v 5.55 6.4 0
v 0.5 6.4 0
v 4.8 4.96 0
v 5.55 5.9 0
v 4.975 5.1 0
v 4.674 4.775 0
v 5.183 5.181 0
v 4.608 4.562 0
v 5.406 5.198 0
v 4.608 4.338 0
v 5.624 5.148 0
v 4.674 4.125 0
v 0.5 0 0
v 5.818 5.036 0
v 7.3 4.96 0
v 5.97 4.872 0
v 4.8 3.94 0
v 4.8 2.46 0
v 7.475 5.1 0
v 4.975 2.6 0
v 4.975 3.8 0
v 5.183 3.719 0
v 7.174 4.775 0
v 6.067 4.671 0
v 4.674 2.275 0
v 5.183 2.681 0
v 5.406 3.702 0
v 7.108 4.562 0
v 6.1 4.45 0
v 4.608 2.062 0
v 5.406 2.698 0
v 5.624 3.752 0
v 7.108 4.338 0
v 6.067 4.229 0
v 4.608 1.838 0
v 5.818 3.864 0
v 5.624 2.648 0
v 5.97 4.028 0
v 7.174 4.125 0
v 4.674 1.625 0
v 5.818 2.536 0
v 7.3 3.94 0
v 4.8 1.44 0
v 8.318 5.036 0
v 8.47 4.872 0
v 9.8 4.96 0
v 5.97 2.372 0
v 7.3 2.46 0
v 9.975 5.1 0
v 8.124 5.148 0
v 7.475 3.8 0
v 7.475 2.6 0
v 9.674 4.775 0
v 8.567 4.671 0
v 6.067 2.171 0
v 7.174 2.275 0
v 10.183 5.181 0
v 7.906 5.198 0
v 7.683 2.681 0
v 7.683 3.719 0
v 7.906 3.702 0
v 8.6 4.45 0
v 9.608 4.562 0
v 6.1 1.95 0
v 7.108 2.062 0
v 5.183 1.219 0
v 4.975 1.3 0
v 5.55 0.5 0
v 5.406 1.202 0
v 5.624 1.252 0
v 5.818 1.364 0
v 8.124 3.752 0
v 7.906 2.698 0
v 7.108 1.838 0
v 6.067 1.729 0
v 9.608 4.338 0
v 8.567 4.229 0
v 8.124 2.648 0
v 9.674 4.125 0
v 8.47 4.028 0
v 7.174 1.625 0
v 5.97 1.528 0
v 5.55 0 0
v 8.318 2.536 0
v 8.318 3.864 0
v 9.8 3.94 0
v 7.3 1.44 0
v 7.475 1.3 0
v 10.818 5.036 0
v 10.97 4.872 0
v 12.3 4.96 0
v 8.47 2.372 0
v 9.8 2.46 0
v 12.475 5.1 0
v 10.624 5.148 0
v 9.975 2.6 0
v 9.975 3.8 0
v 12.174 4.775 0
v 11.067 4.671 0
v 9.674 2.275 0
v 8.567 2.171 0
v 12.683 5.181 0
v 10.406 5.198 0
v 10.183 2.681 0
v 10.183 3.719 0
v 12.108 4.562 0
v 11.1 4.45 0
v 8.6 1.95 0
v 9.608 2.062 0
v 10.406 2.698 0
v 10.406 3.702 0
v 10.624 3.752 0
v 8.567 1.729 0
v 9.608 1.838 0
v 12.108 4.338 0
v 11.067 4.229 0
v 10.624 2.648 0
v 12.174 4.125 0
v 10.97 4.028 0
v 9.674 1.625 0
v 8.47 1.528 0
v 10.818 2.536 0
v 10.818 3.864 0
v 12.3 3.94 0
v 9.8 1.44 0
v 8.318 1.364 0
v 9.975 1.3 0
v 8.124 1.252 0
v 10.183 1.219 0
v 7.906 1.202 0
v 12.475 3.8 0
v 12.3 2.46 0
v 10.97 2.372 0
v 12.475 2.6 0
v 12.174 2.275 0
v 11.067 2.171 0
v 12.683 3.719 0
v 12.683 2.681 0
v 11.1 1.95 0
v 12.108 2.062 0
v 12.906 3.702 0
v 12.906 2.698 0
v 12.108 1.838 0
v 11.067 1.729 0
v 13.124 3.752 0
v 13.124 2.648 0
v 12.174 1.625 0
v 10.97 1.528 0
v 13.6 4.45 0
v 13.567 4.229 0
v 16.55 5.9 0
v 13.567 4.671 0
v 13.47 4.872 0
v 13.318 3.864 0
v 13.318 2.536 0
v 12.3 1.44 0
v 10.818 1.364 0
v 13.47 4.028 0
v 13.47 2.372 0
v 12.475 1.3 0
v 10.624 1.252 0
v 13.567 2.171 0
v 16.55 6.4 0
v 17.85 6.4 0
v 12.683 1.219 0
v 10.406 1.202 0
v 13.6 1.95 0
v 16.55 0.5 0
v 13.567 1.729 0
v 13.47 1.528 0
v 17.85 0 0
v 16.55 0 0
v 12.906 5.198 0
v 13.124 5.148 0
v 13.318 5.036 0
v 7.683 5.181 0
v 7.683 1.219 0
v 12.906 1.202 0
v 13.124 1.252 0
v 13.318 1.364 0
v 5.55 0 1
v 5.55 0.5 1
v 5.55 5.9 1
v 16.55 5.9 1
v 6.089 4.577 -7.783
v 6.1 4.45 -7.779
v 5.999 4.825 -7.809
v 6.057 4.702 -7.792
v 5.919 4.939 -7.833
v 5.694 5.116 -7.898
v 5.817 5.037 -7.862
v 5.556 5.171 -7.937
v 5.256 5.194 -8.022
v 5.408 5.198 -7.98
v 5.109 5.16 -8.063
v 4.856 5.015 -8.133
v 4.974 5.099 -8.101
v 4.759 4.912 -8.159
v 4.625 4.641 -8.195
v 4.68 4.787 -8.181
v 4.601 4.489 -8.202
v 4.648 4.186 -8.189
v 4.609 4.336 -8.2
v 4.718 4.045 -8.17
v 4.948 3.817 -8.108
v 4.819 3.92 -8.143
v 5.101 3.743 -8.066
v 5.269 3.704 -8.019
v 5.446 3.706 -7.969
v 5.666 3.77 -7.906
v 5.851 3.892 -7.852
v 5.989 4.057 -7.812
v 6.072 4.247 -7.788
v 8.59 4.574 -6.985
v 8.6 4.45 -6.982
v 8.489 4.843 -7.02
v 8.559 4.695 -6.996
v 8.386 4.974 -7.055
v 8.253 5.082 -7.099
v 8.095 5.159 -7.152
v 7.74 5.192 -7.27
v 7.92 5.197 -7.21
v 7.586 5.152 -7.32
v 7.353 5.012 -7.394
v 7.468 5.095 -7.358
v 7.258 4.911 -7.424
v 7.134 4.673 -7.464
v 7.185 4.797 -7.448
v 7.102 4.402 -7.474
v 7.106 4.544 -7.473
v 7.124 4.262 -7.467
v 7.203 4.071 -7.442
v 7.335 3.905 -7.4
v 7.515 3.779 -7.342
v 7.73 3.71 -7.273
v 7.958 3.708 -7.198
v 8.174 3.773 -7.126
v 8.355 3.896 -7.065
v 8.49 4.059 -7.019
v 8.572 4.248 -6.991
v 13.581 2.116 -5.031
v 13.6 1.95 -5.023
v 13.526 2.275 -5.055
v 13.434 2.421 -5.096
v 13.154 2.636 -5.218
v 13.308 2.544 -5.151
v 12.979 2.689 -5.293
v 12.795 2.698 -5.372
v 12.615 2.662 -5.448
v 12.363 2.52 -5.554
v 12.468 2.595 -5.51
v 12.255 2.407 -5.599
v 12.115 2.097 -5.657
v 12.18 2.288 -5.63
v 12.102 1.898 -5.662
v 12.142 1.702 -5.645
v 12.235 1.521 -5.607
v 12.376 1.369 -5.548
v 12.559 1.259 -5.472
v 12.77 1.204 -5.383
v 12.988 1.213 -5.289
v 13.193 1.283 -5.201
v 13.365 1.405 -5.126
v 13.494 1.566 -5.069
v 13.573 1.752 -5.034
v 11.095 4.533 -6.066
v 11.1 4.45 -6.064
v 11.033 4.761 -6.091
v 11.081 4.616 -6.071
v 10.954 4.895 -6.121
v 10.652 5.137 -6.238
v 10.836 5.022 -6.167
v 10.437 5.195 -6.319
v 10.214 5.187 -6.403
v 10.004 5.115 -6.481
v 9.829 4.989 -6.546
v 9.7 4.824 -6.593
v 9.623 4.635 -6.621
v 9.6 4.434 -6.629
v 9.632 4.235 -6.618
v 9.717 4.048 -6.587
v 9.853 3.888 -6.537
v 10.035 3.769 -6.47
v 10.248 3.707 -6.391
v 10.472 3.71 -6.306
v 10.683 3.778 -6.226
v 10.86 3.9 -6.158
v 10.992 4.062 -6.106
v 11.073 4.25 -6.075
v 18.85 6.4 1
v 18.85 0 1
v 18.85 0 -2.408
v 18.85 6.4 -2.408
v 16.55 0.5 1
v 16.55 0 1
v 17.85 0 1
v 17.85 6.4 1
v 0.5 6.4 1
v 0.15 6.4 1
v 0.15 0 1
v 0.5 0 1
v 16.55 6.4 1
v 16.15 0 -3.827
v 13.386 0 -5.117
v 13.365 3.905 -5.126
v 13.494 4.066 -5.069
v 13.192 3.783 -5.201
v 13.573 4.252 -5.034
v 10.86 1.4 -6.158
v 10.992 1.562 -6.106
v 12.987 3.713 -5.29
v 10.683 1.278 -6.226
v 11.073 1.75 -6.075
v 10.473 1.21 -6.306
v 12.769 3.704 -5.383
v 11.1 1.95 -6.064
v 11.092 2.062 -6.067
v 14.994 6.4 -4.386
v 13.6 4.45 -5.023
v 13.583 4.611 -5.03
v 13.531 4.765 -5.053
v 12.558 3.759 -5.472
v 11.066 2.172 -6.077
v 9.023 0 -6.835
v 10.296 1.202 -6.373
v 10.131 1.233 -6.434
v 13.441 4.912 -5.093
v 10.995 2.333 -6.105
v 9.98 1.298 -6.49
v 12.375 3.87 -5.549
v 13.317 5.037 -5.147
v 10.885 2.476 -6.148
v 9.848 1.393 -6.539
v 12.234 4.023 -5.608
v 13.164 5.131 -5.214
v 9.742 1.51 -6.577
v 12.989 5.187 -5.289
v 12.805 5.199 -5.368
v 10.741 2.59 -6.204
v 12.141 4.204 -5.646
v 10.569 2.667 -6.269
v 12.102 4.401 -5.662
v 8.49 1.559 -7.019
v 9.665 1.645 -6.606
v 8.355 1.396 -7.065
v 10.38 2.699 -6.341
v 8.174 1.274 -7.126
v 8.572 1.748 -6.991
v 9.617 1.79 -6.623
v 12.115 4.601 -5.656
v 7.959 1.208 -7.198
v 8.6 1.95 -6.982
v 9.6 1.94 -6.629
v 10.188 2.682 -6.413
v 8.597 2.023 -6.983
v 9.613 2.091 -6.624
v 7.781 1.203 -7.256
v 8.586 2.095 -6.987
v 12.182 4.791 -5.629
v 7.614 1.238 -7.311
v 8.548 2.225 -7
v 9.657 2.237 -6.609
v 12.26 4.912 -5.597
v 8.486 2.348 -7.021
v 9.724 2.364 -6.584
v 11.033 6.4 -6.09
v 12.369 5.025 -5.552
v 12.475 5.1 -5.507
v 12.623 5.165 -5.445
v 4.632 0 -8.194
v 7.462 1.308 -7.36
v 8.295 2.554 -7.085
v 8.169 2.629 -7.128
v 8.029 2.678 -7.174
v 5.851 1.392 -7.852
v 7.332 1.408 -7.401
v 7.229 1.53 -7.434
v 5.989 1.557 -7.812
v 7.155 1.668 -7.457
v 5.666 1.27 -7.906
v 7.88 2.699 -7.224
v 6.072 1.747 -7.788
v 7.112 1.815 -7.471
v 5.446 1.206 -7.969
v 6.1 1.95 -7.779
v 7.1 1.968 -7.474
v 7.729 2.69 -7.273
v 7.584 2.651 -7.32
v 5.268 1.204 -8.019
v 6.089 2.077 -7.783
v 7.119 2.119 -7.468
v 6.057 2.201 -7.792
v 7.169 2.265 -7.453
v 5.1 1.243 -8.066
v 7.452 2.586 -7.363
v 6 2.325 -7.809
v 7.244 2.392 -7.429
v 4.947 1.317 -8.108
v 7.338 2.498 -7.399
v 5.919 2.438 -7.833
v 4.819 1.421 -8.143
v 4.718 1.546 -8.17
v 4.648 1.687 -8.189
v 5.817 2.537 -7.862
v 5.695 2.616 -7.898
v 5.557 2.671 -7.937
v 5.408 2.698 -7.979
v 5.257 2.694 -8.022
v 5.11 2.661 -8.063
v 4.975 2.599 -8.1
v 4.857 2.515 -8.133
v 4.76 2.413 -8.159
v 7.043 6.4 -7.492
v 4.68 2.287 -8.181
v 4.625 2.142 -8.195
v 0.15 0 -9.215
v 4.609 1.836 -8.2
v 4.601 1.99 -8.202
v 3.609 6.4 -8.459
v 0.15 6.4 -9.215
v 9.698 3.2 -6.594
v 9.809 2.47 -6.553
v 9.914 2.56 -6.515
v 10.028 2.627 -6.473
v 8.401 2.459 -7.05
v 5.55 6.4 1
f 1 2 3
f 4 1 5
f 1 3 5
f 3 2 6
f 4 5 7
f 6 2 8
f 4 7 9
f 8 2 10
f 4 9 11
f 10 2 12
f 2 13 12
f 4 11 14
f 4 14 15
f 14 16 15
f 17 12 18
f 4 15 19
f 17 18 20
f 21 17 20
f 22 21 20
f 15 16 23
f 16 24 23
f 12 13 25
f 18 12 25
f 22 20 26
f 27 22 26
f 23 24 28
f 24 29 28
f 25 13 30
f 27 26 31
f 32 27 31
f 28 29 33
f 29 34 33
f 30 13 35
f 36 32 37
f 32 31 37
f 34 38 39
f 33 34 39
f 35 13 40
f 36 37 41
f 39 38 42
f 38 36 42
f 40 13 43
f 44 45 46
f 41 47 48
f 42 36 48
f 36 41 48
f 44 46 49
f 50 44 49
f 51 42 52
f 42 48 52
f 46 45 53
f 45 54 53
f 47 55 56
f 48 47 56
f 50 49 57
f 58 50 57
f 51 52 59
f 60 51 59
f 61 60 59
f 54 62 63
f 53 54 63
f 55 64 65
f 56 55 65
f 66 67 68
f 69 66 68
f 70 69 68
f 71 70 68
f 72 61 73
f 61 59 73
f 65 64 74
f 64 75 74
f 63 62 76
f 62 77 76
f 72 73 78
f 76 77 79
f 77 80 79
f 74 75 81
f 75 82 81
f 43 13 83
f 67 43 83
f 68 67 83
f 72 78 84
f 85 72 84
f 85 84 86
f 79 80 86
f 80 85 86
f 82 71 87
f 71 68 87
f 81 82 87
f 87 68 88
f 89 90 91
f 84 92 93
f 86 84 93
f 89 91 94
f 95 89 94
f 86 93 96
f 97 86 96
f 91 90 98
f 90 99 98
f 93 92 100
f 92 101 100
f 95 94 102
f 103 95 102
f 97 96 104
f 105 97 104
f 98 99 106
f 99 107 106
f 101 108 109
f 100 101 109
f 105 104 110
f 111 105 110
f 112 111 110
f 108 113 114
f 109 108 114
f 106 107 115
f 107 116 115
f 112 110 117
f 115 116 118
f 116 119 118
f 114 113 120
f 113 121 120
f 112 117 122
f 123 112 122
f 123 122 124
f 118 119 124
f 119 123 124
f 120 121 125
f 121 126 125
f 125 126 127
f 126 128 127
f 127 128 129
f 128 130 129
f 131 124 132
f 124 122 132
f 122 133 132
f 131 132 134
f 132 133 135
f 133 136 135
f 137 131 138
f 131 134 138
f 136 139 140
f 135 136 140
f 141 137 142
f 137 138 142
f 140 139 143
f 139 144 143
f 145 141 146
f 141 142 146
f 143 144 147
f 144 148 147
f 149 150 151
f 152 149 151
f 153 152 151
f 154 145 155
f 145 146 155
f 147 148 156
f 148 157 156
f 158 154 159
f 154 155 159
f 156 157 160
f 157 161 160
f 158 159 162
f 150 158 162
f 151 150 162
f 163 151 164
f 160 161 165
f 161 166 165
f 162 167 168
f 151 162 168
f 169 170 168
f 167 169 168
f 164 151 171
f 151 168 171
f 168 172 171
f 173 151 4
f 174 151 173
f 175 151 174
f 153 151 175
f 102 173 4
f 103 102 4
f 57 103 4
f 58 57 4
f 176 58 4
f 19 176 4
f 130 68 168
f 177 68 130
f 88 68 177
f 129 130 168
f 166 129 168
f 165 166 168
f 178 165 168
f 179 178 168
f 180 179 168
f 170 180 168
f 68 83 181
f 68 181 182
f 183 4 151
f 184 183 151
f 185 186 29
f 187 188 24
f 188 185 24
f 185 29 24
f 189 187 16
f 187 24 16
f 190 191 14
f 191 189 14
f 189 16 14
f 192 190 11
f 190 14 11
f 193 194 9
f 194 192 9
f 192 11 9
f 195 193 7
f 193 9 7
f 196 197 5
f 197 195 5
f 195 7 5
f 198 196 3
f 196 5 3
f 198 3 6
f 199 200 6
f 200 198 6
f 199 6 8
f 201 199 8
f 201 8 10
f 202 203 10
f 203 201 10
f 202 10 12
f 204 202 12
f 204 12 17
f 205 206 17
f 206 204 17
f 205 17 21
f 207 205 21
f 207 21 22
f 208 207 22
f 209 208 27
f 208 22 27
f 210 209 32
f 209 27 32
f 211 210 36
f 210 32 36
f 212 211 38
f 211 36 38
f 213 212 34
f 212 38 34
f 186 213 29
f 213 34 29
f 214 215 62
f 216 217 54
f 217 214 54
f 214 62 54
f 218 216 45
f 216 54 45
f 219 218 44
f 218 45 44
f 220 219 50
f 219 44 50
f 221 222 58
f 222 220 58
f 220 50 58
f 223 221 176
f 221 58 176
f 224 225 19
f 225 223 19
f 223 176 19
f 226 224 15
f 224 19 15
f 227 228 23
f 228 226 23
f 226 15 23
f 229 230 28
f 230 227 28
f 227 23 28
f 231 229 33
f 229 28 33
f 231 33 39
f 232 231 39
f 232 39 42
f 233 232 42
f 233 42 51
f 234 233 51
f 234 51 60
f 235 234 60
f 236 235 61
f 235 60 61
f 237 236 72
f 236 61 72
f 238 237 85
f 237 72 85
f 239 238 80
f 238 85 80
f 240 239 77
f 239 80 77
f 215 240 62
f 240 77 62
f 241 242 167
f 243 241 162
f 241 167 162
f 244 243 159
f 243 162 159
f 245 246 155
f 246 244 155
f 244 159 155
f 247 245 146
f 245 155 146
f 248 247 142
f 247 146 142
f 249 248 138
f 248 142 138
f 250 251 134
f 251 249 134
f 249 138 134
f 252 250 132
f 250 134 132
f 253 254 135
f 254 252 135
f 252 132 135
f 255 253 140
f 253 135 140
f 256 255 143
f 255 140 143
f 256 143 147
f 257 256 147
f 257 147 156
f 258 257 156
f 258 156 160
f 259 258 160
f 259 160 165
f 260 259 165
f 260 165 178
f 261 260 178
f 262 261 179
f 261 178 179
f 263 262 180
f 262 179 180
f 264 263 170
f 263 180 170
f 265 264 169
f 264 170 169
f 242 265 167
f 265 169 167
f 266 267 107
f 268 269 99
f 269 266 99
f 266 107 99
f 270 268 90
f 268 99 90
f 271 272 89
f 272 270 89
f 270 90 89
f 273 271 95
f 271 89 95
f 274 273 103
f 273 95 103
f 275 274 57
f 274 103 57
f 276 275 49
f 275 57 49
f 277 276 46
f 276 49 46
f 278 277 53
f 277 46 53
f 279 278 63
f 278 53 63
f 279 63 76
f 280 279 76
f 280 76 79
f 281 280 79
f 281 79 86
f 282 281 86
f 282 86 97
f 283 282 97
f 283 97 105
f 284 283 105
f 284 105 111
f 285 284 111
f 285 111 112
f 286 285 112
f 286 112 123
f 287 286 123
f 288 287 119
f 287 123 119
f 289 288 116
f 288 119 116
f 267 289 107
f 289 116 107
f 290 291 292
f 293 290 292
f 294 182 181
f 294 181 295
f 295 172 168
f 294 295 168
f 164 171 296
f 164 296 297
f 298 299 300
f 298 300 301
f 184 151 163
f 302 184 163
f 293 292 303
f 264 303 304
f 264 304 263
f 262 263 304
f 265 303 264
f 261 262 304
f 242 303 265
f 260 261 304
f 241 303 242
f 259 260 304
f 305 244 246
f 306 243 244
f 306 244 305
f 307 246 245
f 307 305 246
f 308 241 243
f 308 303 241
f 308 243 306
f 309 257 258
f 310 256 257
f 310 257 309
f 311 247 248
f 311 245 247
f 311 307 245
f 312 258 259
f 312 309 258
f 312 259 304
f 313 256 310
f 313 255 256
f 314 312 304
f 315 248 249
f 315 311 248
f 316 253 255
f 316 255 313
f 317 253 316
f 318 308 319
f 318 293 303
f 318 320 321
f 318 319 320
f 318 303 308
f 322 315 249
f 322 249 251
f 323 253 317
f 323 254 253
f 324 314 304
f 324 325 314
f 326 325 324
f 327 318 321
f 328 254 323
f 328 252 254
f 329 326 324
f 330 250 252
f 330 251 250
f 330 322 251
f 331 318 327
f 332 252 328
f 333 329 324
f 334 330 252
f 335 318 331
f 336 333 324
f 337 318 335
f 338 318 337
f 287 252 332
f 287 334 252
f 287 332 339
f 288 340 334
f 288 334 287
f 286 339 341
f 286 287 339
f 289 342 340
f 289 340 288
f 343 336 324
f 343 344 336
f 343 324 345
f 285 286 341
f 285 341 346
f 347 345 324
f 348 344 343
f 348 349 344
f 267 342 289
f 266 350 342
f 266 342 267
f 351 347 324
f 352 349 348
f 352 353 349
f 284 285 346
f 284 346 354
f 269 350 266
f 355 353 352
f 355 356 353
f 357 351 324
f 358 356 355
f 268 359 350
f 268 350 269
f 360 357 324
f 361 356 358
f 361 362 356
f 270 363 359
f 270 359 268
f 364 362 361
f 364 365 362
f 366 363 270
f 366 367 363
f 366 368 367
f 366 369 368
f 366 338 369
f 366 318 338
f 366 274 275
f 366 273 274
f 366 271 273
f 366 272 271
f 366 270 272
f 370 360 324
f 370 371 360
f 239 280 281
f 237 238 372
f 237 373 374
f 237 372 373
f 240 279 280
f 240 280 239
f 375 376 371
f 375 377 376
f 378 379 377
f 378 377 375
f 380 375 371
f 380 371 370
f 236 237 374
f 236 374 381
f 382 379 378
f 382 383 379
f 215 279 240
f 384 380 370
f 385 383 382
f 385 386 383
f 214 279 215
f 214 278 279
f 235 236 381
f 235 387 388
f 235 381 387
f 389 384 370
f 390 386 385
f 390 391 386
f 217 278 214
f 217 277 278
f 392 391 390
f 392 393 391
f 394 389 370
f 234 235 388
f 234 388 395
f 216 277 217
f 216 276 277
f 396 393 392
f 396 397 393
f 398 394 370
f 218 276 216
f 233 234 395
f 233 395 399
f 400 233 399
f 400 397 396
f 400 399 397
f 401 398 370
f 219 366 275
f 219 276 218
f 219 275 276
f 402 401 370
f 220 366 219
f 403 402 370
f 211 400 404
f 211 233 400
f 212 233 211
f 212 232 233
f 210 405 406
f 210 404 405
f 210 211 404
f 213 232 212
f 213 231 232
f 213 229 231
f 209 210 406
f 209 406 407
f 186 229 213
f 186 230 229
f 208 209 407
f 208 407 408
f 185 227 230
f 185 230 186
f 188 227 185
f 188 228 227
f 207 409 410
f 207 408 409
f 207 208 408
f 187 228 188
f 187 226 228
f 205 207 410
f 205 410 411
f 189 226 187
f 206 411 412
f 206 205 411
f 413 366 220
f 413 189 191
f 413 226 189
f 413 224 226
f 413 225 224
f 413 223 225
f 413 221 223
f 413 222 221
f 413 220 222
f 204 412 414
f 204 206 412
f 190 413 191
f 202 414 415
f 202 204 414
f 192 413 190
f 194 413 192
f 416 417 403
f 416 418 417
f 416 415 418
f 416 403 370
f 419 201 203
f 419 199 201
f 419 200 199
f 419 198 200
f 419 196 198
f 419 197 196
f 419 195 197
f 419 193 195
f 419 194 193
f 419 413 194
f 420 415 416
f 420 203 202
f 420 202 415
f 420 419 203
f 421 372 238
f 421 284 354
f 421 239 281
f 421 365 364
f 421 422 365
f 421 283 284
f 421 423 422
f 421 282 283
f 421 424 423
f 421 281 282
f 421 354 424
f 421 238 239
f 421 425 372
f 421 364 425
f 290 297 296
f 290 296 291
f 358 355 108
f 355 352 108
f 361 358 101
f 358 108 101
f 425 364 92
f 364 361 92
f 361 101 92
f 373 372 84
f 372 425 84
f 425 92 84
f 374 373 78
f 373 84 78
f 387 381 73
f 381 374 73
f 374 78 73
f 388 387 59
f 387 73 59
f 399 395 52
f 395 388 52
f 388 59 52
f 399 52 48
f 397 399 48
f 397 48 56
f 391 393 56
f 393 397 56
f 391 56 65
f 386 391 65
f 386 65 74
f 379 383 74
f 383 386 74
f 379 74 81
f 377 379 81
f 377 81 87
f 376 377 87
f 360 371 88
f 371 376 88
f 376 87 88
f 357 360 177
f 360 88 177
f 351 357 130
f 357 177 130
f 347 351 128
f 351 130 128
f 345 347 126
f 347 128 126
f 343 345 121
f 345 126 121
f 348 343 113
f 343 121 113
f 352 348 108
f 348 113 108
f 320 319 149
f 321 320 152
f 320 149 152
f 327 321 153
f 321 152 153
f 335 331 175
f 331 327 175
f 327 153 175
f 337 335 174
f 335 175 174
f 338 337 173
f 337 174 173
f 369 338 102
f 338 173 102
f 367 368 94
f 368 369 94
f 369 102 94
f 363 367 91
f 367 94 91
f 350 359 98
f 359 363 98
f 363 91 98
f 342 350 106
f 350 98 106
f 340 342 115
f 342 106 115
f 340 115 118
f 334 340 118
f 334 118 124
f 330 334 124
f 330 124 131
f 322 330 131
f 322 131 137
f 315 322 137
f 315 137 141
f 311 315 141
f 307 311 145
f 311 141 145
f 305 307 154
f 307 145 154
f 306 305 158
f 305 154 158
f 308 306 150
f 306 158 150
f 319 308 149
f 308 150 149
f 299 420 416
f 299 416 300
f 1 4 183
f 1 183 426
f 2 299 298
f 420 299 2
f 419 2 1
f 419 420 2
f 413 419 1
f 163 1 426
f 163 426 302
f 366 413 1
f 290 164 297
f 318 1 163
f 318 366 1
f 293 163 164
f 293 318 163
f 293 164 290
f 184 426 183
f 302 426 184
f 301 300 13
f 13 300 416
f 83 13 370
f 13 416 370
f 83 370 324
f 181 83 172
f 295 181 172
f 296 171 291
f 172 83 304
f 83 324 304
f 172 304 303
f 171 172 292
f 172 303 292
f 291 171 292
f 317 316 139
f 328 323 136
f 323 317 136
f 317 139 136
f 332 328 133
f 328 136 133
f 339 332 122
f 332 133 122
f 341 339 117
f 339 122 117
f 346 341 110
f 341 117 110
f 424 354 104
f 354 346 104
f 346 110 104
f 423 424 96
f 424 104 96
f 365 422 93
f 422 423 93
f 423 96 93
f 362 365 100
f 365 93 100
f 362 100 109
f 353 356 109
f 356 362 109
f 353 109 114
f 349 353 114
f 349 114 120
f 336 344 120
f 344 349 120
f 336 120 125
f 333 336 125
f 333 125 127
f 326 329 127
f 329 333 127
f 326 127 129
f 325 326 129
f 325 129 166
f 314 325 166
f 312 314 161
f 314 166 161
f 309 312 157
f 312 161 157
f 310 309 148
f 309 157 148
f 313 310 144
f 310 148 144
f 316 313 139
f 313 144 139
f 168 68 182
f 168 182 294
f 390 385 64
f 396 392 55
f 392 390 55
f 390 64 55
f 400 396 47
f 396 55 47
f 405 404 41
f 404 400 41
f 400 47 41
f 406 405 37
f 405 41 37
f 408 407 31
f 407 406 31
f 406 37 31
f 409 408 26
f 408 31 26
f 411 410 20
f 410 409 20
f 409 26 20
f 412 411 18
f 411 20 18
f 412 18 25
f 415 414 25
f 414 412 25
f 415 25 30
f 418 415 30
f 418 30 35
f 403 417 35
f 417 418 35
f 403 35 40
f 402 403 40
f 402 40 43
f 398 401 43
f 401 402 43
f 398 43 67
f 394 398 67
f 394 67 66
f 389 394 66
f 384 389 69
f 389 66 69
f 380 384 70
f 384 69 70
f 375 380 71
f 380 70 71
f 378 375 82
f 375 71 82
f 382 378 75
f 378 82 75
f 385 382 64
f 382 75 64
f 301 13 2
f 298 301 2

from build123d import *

# Parameters (mm, degrees)
BOSS_EXTRUDE1_DEPTH = 6.4
CUT_EXTRUDE1_REACH  = 17
SKETCH2_R           = 0.75
CUT_EXTRUDE2_REACH  = 8.4
SKETCH9_W           = 0.5
SKETCH9_H           = 6.4
SKETCH9_W_2         = 1
SKETCH9_W_3         = 11
SKETCH9_H_2         = 0.5
BOSS_EXTRUDE2_DEPTH = 1
SKETCH10_W          = 10.242926678
SKETCH10_H          = 6.4
CUT_EXTRUDE7_DEPTH  = 0.15


with BuildPart() as part:
    # Sketch1 → Boss-Extrude1 (new body)
    with BuildSketch(Plane(origin=(0, 0, 0), x_dir=(1, 0, 0), z_dir=(0, 1, 0))):
        Polygon((0, 15), (0, 0), (18.850032676, 0), (18.850032676, 10), align=None)
    extrude(amount=BOSS_EXTRUDE1_DEPTH)

    # Cut-Extrude1: up to this plane
    cut_extrude1_end = Plane(origin=(18.850032676, 6.4, -10), z_dir=(-0.256385401, 0, 0.966574636))
    # Sketch2 → Cut-Extrude1 (cut, up to the surface)
    with BuildSketch(Plane.XY, mode=Mode.PRIVATE) as cut_extrude1_sk1:
        with Locations((12.850032676, 4.45)):
            Circle(SKETCH2_R)
    cut_extrude1_tool1 = split(extrude(cut_extrude1_sk1.sketch, amount=-CUT_EXTRUDE1_REACH, mode=Mode.PRIVATE), bisect_by=cut_extrude1_end, keep=Keep.BOTH, mode=Mode.PRIVATE)
    add(cut_extrude1_tool1.solids().sort_by_distance((12.850033, 4.45, 0))[0], mode=Mode.SUBTRACT)
    # Sketch2 → Cut-Extrude1 (cut, up to the surface)
    with BuildSketch(Plane.XY, mode=Mode.PRIVATE) as cut_extrude1_sk2:
        with Locations((12.850032676, 1.95)):
            Circle(SKETCH2_R)
    cut_extrude1_tool2 = split(extrude(cut_extrude1_sk2.sketch, amount=-CUT_EXTRUDE1_REACH, mode=Mode.PRIVATE), bisect_by=cut_extrude1_end, keep=Keep.BOTH, mode=Mode.PRIVATE)
    add(cut_extrude1_tool2.solids().sort_by_distance((12.850033, 1.95, 0))[0], mode=Mode.SUBTRACT)
    # Sketch2 → Cut-Extrude1 (cut, up to the surface)
    with BuildSketch(Plane.XY, mode=Mode.PRIVATE) as cut_extrude1_sk3:
        with Locations((5.350032676, 1.95)):
            Circle(SKETCH2_R)
    cut_extrude1_tool3 = split(extrude(cut_extrude1_sk3.sketch, amount=-CUT_EXTRUDE1_REACH, mode=Mode.PRIVATE), bisect_by=cut_extrude1_end, keep=Keep.BOTH, mode=Mode.PRIVATE)
    add(cut_extrude1_tool3.solids().sort_by_distance((5.350033, 1.95, 0))[0], mode=Mode.SUBTRACT)
    # Sketch2 → Cut-Extrude1 (cut, up to the surface)
    with BuildSketch(Plane.XY, mode=Mode.PRIVATE) as cut_extrude1_sk4:
        with Locations((5.350032676, 4.45)):
            Circle(SKETCH2_R)
    cut_extrude1_tool4 = split(extrude(cut_extrude1_sk4.sketch, amount=-CUT_EXTRUDE1_REACH, mode=Mode.PRIVATE), bisect_by=cut_extrude1_end, keep=Keep.BOTH, mode=Mode.PRIVATE)
    add(cut_extrude1_tool4.solids().sort_by_distance((5.350033, 4.45, 0))[0], mode=Mode.SUBTRACT)
    # Sketch2 → Cut-Extrude1 (cut, up to the surface)
    with BuildSketch(Plane.XY, mode=Mode.PRIVATE) as cut_extrude1_sk5:
        with Locations((7.850032676, 4.45)):
            Circle(SKETCH2_R)
    cut_extrude1_tool5 = split(extrude(cut_extrude1_sk5.sketch, amount=-CUT_EXTRUDE1_REACH, mode=Mode.PRIVATE), bisect_by=cut_extrude1_end, keep=Keep.BOTH, mode=Mode.PRIVATE)
    add(cut_extrude1_tool5.solids().sort_by_distance((7.850033, 4.45, 0))[0], mode=Mode.SUBTRACT)
    # Sketch2 → Cut-Extrude1 (cut, up to the surface)
    with BuildSketch(Plane.XY, mode=Mode.PRIVATE) as cut_extrude1_sk6:
        with Locations((10.350032676, 4.45)):
            Circle(SKETCH2_R)
    cut_extrude1_tool6 = split(extrude(cut_extrude1_sk6.sketch, amount=-CUT_EXTRUDE1_REACH, mode=Mode.PRIVATE), bisect_by=cut_extrude1_end, keep=Keep.BOTH, mode=Mode.PRIVATE)
    add(cut_extrude1_tool6.solids().sort_by_distance((10.350033, 4.45, 0))[0], mode=Mode.SUBTRACT)
    # Sketch2 → Cut-Extrude1 (cut, up to the surface)
    with BuildSketch(Plane.XY, mode=Mode.PRIVATE) as cut_extrude1_sk7:
        with Locations((7.850032676, 1.95)):
            Circle(SKETCH2_R)
    cut_extrude1_tool7 = split(extrude(cut_extrude1_sk7.sketch, amount=-CUT_EXTRUDE1_REACH, mode=Mode.PRIVATE), bisect_by=cut_extrude1_end, keep=Keep.BOTH, mode=Mode.PRIVATE)
    add(cut_extrude1_tool7.solids().sort_by_distance((7.850033, 1.95, 0))[0], mode=Mode.SUBTRACT)
    # Sketch2 → Cut-Extrude1 (cut, up to the surface)
    with BuildSketch(Plane.XY, mode=Mode.PRIVATE) as cut_extrude1_sk8:
        with Locations((10.350032676, 1.95)):
            Circle(SKETCH2_R)
    cut_extrude1_tool8 = split(extrude(cut_extrude1_sk8.sketch, amount=-CUT_EXTRUDE1_REACH, mode=Mode.PRIVATE), bisect_by=cut_extrude1_end, keep=Keep.BOTH, mode=Mode.PRIVATE)
    add(cut_extrude1_tool8.solids().sort_by_distance((10.350033, 1.95, 0))[0], mode=Mode.SUBTRACT)

    # Sketch3 → Cut-Extrude2 (cut, up to next)
    with BuildSketch(Plane(origin=(0, 6.4, 0), x_dir=(1, 0, 0), z_dir=(0, 1, 0)), mode=Mode.PRIVATE) as cut_extrude2_sk1:
        with BuildLine():
            Line((0, 15), (0, 9.242926678))
            add(Edge.make_bspline(
                [(18.850032676, 2.408422132), (9.827679117, 7.423862257), (0, 9.242926678)],
                knots=[2.52003539, 2.52003539, 2.52003539, 2.823158509, 2.823158509, 2.823158509], degree=2, weights=[1, 0.988536516, 1]))
            Line((18.850032676, 2.408422132), (18.850032676, 10))
            Line((18.850032676, 10), (0, 15))
        make_face()
    cut_extrude2_tool1 = extrude(cut_extrude2_sk1.sketch, amount=-CUT_EXTRUDE2_REACH, mode=Mode.PRIVATE) & part.part
    add(cut_extrude2_tool1.solids().sort_by_distance((9.890162, 6.4, -9.301074))[0], mode=Mode.SUBTRACT)

    # Sketch9 → Boss-Extrude2 (add)
    with BuildSketch(Plane.XY):
        with Locations((0.25, 3.2)):
            Rectangle(SKETCH9_W, SKETCH9_H)
        with Locations((18.350032676, 3.2)):
            Rectangle(SKETCH9_W_2, SKETCH9_H)
        with Locations((11.050032676, 6.15)):
            Rectangle(SKETCH9_W_3, SKETCH9_H_2)
        with Locations((11.050032676, 0.25)):
            Rectangle(SKETCH9_W_3, SKETCH9_H_2)
    extrude(amount=BOSS_EXTRUDE2_DEPTH)

    # Sketch10 → Cut-Extrude7 (cut)
    with BuildSketch(Plane.ZY):
        with Locations((-4.121463339, 3.2)):
            Rectangle(SKETCH10_W, SKETCH10_H)
    extrude(amount=-CUT_EXTRUDE7_DEPTH, mode=Mode.SUBTRACT)


solid = part.part
